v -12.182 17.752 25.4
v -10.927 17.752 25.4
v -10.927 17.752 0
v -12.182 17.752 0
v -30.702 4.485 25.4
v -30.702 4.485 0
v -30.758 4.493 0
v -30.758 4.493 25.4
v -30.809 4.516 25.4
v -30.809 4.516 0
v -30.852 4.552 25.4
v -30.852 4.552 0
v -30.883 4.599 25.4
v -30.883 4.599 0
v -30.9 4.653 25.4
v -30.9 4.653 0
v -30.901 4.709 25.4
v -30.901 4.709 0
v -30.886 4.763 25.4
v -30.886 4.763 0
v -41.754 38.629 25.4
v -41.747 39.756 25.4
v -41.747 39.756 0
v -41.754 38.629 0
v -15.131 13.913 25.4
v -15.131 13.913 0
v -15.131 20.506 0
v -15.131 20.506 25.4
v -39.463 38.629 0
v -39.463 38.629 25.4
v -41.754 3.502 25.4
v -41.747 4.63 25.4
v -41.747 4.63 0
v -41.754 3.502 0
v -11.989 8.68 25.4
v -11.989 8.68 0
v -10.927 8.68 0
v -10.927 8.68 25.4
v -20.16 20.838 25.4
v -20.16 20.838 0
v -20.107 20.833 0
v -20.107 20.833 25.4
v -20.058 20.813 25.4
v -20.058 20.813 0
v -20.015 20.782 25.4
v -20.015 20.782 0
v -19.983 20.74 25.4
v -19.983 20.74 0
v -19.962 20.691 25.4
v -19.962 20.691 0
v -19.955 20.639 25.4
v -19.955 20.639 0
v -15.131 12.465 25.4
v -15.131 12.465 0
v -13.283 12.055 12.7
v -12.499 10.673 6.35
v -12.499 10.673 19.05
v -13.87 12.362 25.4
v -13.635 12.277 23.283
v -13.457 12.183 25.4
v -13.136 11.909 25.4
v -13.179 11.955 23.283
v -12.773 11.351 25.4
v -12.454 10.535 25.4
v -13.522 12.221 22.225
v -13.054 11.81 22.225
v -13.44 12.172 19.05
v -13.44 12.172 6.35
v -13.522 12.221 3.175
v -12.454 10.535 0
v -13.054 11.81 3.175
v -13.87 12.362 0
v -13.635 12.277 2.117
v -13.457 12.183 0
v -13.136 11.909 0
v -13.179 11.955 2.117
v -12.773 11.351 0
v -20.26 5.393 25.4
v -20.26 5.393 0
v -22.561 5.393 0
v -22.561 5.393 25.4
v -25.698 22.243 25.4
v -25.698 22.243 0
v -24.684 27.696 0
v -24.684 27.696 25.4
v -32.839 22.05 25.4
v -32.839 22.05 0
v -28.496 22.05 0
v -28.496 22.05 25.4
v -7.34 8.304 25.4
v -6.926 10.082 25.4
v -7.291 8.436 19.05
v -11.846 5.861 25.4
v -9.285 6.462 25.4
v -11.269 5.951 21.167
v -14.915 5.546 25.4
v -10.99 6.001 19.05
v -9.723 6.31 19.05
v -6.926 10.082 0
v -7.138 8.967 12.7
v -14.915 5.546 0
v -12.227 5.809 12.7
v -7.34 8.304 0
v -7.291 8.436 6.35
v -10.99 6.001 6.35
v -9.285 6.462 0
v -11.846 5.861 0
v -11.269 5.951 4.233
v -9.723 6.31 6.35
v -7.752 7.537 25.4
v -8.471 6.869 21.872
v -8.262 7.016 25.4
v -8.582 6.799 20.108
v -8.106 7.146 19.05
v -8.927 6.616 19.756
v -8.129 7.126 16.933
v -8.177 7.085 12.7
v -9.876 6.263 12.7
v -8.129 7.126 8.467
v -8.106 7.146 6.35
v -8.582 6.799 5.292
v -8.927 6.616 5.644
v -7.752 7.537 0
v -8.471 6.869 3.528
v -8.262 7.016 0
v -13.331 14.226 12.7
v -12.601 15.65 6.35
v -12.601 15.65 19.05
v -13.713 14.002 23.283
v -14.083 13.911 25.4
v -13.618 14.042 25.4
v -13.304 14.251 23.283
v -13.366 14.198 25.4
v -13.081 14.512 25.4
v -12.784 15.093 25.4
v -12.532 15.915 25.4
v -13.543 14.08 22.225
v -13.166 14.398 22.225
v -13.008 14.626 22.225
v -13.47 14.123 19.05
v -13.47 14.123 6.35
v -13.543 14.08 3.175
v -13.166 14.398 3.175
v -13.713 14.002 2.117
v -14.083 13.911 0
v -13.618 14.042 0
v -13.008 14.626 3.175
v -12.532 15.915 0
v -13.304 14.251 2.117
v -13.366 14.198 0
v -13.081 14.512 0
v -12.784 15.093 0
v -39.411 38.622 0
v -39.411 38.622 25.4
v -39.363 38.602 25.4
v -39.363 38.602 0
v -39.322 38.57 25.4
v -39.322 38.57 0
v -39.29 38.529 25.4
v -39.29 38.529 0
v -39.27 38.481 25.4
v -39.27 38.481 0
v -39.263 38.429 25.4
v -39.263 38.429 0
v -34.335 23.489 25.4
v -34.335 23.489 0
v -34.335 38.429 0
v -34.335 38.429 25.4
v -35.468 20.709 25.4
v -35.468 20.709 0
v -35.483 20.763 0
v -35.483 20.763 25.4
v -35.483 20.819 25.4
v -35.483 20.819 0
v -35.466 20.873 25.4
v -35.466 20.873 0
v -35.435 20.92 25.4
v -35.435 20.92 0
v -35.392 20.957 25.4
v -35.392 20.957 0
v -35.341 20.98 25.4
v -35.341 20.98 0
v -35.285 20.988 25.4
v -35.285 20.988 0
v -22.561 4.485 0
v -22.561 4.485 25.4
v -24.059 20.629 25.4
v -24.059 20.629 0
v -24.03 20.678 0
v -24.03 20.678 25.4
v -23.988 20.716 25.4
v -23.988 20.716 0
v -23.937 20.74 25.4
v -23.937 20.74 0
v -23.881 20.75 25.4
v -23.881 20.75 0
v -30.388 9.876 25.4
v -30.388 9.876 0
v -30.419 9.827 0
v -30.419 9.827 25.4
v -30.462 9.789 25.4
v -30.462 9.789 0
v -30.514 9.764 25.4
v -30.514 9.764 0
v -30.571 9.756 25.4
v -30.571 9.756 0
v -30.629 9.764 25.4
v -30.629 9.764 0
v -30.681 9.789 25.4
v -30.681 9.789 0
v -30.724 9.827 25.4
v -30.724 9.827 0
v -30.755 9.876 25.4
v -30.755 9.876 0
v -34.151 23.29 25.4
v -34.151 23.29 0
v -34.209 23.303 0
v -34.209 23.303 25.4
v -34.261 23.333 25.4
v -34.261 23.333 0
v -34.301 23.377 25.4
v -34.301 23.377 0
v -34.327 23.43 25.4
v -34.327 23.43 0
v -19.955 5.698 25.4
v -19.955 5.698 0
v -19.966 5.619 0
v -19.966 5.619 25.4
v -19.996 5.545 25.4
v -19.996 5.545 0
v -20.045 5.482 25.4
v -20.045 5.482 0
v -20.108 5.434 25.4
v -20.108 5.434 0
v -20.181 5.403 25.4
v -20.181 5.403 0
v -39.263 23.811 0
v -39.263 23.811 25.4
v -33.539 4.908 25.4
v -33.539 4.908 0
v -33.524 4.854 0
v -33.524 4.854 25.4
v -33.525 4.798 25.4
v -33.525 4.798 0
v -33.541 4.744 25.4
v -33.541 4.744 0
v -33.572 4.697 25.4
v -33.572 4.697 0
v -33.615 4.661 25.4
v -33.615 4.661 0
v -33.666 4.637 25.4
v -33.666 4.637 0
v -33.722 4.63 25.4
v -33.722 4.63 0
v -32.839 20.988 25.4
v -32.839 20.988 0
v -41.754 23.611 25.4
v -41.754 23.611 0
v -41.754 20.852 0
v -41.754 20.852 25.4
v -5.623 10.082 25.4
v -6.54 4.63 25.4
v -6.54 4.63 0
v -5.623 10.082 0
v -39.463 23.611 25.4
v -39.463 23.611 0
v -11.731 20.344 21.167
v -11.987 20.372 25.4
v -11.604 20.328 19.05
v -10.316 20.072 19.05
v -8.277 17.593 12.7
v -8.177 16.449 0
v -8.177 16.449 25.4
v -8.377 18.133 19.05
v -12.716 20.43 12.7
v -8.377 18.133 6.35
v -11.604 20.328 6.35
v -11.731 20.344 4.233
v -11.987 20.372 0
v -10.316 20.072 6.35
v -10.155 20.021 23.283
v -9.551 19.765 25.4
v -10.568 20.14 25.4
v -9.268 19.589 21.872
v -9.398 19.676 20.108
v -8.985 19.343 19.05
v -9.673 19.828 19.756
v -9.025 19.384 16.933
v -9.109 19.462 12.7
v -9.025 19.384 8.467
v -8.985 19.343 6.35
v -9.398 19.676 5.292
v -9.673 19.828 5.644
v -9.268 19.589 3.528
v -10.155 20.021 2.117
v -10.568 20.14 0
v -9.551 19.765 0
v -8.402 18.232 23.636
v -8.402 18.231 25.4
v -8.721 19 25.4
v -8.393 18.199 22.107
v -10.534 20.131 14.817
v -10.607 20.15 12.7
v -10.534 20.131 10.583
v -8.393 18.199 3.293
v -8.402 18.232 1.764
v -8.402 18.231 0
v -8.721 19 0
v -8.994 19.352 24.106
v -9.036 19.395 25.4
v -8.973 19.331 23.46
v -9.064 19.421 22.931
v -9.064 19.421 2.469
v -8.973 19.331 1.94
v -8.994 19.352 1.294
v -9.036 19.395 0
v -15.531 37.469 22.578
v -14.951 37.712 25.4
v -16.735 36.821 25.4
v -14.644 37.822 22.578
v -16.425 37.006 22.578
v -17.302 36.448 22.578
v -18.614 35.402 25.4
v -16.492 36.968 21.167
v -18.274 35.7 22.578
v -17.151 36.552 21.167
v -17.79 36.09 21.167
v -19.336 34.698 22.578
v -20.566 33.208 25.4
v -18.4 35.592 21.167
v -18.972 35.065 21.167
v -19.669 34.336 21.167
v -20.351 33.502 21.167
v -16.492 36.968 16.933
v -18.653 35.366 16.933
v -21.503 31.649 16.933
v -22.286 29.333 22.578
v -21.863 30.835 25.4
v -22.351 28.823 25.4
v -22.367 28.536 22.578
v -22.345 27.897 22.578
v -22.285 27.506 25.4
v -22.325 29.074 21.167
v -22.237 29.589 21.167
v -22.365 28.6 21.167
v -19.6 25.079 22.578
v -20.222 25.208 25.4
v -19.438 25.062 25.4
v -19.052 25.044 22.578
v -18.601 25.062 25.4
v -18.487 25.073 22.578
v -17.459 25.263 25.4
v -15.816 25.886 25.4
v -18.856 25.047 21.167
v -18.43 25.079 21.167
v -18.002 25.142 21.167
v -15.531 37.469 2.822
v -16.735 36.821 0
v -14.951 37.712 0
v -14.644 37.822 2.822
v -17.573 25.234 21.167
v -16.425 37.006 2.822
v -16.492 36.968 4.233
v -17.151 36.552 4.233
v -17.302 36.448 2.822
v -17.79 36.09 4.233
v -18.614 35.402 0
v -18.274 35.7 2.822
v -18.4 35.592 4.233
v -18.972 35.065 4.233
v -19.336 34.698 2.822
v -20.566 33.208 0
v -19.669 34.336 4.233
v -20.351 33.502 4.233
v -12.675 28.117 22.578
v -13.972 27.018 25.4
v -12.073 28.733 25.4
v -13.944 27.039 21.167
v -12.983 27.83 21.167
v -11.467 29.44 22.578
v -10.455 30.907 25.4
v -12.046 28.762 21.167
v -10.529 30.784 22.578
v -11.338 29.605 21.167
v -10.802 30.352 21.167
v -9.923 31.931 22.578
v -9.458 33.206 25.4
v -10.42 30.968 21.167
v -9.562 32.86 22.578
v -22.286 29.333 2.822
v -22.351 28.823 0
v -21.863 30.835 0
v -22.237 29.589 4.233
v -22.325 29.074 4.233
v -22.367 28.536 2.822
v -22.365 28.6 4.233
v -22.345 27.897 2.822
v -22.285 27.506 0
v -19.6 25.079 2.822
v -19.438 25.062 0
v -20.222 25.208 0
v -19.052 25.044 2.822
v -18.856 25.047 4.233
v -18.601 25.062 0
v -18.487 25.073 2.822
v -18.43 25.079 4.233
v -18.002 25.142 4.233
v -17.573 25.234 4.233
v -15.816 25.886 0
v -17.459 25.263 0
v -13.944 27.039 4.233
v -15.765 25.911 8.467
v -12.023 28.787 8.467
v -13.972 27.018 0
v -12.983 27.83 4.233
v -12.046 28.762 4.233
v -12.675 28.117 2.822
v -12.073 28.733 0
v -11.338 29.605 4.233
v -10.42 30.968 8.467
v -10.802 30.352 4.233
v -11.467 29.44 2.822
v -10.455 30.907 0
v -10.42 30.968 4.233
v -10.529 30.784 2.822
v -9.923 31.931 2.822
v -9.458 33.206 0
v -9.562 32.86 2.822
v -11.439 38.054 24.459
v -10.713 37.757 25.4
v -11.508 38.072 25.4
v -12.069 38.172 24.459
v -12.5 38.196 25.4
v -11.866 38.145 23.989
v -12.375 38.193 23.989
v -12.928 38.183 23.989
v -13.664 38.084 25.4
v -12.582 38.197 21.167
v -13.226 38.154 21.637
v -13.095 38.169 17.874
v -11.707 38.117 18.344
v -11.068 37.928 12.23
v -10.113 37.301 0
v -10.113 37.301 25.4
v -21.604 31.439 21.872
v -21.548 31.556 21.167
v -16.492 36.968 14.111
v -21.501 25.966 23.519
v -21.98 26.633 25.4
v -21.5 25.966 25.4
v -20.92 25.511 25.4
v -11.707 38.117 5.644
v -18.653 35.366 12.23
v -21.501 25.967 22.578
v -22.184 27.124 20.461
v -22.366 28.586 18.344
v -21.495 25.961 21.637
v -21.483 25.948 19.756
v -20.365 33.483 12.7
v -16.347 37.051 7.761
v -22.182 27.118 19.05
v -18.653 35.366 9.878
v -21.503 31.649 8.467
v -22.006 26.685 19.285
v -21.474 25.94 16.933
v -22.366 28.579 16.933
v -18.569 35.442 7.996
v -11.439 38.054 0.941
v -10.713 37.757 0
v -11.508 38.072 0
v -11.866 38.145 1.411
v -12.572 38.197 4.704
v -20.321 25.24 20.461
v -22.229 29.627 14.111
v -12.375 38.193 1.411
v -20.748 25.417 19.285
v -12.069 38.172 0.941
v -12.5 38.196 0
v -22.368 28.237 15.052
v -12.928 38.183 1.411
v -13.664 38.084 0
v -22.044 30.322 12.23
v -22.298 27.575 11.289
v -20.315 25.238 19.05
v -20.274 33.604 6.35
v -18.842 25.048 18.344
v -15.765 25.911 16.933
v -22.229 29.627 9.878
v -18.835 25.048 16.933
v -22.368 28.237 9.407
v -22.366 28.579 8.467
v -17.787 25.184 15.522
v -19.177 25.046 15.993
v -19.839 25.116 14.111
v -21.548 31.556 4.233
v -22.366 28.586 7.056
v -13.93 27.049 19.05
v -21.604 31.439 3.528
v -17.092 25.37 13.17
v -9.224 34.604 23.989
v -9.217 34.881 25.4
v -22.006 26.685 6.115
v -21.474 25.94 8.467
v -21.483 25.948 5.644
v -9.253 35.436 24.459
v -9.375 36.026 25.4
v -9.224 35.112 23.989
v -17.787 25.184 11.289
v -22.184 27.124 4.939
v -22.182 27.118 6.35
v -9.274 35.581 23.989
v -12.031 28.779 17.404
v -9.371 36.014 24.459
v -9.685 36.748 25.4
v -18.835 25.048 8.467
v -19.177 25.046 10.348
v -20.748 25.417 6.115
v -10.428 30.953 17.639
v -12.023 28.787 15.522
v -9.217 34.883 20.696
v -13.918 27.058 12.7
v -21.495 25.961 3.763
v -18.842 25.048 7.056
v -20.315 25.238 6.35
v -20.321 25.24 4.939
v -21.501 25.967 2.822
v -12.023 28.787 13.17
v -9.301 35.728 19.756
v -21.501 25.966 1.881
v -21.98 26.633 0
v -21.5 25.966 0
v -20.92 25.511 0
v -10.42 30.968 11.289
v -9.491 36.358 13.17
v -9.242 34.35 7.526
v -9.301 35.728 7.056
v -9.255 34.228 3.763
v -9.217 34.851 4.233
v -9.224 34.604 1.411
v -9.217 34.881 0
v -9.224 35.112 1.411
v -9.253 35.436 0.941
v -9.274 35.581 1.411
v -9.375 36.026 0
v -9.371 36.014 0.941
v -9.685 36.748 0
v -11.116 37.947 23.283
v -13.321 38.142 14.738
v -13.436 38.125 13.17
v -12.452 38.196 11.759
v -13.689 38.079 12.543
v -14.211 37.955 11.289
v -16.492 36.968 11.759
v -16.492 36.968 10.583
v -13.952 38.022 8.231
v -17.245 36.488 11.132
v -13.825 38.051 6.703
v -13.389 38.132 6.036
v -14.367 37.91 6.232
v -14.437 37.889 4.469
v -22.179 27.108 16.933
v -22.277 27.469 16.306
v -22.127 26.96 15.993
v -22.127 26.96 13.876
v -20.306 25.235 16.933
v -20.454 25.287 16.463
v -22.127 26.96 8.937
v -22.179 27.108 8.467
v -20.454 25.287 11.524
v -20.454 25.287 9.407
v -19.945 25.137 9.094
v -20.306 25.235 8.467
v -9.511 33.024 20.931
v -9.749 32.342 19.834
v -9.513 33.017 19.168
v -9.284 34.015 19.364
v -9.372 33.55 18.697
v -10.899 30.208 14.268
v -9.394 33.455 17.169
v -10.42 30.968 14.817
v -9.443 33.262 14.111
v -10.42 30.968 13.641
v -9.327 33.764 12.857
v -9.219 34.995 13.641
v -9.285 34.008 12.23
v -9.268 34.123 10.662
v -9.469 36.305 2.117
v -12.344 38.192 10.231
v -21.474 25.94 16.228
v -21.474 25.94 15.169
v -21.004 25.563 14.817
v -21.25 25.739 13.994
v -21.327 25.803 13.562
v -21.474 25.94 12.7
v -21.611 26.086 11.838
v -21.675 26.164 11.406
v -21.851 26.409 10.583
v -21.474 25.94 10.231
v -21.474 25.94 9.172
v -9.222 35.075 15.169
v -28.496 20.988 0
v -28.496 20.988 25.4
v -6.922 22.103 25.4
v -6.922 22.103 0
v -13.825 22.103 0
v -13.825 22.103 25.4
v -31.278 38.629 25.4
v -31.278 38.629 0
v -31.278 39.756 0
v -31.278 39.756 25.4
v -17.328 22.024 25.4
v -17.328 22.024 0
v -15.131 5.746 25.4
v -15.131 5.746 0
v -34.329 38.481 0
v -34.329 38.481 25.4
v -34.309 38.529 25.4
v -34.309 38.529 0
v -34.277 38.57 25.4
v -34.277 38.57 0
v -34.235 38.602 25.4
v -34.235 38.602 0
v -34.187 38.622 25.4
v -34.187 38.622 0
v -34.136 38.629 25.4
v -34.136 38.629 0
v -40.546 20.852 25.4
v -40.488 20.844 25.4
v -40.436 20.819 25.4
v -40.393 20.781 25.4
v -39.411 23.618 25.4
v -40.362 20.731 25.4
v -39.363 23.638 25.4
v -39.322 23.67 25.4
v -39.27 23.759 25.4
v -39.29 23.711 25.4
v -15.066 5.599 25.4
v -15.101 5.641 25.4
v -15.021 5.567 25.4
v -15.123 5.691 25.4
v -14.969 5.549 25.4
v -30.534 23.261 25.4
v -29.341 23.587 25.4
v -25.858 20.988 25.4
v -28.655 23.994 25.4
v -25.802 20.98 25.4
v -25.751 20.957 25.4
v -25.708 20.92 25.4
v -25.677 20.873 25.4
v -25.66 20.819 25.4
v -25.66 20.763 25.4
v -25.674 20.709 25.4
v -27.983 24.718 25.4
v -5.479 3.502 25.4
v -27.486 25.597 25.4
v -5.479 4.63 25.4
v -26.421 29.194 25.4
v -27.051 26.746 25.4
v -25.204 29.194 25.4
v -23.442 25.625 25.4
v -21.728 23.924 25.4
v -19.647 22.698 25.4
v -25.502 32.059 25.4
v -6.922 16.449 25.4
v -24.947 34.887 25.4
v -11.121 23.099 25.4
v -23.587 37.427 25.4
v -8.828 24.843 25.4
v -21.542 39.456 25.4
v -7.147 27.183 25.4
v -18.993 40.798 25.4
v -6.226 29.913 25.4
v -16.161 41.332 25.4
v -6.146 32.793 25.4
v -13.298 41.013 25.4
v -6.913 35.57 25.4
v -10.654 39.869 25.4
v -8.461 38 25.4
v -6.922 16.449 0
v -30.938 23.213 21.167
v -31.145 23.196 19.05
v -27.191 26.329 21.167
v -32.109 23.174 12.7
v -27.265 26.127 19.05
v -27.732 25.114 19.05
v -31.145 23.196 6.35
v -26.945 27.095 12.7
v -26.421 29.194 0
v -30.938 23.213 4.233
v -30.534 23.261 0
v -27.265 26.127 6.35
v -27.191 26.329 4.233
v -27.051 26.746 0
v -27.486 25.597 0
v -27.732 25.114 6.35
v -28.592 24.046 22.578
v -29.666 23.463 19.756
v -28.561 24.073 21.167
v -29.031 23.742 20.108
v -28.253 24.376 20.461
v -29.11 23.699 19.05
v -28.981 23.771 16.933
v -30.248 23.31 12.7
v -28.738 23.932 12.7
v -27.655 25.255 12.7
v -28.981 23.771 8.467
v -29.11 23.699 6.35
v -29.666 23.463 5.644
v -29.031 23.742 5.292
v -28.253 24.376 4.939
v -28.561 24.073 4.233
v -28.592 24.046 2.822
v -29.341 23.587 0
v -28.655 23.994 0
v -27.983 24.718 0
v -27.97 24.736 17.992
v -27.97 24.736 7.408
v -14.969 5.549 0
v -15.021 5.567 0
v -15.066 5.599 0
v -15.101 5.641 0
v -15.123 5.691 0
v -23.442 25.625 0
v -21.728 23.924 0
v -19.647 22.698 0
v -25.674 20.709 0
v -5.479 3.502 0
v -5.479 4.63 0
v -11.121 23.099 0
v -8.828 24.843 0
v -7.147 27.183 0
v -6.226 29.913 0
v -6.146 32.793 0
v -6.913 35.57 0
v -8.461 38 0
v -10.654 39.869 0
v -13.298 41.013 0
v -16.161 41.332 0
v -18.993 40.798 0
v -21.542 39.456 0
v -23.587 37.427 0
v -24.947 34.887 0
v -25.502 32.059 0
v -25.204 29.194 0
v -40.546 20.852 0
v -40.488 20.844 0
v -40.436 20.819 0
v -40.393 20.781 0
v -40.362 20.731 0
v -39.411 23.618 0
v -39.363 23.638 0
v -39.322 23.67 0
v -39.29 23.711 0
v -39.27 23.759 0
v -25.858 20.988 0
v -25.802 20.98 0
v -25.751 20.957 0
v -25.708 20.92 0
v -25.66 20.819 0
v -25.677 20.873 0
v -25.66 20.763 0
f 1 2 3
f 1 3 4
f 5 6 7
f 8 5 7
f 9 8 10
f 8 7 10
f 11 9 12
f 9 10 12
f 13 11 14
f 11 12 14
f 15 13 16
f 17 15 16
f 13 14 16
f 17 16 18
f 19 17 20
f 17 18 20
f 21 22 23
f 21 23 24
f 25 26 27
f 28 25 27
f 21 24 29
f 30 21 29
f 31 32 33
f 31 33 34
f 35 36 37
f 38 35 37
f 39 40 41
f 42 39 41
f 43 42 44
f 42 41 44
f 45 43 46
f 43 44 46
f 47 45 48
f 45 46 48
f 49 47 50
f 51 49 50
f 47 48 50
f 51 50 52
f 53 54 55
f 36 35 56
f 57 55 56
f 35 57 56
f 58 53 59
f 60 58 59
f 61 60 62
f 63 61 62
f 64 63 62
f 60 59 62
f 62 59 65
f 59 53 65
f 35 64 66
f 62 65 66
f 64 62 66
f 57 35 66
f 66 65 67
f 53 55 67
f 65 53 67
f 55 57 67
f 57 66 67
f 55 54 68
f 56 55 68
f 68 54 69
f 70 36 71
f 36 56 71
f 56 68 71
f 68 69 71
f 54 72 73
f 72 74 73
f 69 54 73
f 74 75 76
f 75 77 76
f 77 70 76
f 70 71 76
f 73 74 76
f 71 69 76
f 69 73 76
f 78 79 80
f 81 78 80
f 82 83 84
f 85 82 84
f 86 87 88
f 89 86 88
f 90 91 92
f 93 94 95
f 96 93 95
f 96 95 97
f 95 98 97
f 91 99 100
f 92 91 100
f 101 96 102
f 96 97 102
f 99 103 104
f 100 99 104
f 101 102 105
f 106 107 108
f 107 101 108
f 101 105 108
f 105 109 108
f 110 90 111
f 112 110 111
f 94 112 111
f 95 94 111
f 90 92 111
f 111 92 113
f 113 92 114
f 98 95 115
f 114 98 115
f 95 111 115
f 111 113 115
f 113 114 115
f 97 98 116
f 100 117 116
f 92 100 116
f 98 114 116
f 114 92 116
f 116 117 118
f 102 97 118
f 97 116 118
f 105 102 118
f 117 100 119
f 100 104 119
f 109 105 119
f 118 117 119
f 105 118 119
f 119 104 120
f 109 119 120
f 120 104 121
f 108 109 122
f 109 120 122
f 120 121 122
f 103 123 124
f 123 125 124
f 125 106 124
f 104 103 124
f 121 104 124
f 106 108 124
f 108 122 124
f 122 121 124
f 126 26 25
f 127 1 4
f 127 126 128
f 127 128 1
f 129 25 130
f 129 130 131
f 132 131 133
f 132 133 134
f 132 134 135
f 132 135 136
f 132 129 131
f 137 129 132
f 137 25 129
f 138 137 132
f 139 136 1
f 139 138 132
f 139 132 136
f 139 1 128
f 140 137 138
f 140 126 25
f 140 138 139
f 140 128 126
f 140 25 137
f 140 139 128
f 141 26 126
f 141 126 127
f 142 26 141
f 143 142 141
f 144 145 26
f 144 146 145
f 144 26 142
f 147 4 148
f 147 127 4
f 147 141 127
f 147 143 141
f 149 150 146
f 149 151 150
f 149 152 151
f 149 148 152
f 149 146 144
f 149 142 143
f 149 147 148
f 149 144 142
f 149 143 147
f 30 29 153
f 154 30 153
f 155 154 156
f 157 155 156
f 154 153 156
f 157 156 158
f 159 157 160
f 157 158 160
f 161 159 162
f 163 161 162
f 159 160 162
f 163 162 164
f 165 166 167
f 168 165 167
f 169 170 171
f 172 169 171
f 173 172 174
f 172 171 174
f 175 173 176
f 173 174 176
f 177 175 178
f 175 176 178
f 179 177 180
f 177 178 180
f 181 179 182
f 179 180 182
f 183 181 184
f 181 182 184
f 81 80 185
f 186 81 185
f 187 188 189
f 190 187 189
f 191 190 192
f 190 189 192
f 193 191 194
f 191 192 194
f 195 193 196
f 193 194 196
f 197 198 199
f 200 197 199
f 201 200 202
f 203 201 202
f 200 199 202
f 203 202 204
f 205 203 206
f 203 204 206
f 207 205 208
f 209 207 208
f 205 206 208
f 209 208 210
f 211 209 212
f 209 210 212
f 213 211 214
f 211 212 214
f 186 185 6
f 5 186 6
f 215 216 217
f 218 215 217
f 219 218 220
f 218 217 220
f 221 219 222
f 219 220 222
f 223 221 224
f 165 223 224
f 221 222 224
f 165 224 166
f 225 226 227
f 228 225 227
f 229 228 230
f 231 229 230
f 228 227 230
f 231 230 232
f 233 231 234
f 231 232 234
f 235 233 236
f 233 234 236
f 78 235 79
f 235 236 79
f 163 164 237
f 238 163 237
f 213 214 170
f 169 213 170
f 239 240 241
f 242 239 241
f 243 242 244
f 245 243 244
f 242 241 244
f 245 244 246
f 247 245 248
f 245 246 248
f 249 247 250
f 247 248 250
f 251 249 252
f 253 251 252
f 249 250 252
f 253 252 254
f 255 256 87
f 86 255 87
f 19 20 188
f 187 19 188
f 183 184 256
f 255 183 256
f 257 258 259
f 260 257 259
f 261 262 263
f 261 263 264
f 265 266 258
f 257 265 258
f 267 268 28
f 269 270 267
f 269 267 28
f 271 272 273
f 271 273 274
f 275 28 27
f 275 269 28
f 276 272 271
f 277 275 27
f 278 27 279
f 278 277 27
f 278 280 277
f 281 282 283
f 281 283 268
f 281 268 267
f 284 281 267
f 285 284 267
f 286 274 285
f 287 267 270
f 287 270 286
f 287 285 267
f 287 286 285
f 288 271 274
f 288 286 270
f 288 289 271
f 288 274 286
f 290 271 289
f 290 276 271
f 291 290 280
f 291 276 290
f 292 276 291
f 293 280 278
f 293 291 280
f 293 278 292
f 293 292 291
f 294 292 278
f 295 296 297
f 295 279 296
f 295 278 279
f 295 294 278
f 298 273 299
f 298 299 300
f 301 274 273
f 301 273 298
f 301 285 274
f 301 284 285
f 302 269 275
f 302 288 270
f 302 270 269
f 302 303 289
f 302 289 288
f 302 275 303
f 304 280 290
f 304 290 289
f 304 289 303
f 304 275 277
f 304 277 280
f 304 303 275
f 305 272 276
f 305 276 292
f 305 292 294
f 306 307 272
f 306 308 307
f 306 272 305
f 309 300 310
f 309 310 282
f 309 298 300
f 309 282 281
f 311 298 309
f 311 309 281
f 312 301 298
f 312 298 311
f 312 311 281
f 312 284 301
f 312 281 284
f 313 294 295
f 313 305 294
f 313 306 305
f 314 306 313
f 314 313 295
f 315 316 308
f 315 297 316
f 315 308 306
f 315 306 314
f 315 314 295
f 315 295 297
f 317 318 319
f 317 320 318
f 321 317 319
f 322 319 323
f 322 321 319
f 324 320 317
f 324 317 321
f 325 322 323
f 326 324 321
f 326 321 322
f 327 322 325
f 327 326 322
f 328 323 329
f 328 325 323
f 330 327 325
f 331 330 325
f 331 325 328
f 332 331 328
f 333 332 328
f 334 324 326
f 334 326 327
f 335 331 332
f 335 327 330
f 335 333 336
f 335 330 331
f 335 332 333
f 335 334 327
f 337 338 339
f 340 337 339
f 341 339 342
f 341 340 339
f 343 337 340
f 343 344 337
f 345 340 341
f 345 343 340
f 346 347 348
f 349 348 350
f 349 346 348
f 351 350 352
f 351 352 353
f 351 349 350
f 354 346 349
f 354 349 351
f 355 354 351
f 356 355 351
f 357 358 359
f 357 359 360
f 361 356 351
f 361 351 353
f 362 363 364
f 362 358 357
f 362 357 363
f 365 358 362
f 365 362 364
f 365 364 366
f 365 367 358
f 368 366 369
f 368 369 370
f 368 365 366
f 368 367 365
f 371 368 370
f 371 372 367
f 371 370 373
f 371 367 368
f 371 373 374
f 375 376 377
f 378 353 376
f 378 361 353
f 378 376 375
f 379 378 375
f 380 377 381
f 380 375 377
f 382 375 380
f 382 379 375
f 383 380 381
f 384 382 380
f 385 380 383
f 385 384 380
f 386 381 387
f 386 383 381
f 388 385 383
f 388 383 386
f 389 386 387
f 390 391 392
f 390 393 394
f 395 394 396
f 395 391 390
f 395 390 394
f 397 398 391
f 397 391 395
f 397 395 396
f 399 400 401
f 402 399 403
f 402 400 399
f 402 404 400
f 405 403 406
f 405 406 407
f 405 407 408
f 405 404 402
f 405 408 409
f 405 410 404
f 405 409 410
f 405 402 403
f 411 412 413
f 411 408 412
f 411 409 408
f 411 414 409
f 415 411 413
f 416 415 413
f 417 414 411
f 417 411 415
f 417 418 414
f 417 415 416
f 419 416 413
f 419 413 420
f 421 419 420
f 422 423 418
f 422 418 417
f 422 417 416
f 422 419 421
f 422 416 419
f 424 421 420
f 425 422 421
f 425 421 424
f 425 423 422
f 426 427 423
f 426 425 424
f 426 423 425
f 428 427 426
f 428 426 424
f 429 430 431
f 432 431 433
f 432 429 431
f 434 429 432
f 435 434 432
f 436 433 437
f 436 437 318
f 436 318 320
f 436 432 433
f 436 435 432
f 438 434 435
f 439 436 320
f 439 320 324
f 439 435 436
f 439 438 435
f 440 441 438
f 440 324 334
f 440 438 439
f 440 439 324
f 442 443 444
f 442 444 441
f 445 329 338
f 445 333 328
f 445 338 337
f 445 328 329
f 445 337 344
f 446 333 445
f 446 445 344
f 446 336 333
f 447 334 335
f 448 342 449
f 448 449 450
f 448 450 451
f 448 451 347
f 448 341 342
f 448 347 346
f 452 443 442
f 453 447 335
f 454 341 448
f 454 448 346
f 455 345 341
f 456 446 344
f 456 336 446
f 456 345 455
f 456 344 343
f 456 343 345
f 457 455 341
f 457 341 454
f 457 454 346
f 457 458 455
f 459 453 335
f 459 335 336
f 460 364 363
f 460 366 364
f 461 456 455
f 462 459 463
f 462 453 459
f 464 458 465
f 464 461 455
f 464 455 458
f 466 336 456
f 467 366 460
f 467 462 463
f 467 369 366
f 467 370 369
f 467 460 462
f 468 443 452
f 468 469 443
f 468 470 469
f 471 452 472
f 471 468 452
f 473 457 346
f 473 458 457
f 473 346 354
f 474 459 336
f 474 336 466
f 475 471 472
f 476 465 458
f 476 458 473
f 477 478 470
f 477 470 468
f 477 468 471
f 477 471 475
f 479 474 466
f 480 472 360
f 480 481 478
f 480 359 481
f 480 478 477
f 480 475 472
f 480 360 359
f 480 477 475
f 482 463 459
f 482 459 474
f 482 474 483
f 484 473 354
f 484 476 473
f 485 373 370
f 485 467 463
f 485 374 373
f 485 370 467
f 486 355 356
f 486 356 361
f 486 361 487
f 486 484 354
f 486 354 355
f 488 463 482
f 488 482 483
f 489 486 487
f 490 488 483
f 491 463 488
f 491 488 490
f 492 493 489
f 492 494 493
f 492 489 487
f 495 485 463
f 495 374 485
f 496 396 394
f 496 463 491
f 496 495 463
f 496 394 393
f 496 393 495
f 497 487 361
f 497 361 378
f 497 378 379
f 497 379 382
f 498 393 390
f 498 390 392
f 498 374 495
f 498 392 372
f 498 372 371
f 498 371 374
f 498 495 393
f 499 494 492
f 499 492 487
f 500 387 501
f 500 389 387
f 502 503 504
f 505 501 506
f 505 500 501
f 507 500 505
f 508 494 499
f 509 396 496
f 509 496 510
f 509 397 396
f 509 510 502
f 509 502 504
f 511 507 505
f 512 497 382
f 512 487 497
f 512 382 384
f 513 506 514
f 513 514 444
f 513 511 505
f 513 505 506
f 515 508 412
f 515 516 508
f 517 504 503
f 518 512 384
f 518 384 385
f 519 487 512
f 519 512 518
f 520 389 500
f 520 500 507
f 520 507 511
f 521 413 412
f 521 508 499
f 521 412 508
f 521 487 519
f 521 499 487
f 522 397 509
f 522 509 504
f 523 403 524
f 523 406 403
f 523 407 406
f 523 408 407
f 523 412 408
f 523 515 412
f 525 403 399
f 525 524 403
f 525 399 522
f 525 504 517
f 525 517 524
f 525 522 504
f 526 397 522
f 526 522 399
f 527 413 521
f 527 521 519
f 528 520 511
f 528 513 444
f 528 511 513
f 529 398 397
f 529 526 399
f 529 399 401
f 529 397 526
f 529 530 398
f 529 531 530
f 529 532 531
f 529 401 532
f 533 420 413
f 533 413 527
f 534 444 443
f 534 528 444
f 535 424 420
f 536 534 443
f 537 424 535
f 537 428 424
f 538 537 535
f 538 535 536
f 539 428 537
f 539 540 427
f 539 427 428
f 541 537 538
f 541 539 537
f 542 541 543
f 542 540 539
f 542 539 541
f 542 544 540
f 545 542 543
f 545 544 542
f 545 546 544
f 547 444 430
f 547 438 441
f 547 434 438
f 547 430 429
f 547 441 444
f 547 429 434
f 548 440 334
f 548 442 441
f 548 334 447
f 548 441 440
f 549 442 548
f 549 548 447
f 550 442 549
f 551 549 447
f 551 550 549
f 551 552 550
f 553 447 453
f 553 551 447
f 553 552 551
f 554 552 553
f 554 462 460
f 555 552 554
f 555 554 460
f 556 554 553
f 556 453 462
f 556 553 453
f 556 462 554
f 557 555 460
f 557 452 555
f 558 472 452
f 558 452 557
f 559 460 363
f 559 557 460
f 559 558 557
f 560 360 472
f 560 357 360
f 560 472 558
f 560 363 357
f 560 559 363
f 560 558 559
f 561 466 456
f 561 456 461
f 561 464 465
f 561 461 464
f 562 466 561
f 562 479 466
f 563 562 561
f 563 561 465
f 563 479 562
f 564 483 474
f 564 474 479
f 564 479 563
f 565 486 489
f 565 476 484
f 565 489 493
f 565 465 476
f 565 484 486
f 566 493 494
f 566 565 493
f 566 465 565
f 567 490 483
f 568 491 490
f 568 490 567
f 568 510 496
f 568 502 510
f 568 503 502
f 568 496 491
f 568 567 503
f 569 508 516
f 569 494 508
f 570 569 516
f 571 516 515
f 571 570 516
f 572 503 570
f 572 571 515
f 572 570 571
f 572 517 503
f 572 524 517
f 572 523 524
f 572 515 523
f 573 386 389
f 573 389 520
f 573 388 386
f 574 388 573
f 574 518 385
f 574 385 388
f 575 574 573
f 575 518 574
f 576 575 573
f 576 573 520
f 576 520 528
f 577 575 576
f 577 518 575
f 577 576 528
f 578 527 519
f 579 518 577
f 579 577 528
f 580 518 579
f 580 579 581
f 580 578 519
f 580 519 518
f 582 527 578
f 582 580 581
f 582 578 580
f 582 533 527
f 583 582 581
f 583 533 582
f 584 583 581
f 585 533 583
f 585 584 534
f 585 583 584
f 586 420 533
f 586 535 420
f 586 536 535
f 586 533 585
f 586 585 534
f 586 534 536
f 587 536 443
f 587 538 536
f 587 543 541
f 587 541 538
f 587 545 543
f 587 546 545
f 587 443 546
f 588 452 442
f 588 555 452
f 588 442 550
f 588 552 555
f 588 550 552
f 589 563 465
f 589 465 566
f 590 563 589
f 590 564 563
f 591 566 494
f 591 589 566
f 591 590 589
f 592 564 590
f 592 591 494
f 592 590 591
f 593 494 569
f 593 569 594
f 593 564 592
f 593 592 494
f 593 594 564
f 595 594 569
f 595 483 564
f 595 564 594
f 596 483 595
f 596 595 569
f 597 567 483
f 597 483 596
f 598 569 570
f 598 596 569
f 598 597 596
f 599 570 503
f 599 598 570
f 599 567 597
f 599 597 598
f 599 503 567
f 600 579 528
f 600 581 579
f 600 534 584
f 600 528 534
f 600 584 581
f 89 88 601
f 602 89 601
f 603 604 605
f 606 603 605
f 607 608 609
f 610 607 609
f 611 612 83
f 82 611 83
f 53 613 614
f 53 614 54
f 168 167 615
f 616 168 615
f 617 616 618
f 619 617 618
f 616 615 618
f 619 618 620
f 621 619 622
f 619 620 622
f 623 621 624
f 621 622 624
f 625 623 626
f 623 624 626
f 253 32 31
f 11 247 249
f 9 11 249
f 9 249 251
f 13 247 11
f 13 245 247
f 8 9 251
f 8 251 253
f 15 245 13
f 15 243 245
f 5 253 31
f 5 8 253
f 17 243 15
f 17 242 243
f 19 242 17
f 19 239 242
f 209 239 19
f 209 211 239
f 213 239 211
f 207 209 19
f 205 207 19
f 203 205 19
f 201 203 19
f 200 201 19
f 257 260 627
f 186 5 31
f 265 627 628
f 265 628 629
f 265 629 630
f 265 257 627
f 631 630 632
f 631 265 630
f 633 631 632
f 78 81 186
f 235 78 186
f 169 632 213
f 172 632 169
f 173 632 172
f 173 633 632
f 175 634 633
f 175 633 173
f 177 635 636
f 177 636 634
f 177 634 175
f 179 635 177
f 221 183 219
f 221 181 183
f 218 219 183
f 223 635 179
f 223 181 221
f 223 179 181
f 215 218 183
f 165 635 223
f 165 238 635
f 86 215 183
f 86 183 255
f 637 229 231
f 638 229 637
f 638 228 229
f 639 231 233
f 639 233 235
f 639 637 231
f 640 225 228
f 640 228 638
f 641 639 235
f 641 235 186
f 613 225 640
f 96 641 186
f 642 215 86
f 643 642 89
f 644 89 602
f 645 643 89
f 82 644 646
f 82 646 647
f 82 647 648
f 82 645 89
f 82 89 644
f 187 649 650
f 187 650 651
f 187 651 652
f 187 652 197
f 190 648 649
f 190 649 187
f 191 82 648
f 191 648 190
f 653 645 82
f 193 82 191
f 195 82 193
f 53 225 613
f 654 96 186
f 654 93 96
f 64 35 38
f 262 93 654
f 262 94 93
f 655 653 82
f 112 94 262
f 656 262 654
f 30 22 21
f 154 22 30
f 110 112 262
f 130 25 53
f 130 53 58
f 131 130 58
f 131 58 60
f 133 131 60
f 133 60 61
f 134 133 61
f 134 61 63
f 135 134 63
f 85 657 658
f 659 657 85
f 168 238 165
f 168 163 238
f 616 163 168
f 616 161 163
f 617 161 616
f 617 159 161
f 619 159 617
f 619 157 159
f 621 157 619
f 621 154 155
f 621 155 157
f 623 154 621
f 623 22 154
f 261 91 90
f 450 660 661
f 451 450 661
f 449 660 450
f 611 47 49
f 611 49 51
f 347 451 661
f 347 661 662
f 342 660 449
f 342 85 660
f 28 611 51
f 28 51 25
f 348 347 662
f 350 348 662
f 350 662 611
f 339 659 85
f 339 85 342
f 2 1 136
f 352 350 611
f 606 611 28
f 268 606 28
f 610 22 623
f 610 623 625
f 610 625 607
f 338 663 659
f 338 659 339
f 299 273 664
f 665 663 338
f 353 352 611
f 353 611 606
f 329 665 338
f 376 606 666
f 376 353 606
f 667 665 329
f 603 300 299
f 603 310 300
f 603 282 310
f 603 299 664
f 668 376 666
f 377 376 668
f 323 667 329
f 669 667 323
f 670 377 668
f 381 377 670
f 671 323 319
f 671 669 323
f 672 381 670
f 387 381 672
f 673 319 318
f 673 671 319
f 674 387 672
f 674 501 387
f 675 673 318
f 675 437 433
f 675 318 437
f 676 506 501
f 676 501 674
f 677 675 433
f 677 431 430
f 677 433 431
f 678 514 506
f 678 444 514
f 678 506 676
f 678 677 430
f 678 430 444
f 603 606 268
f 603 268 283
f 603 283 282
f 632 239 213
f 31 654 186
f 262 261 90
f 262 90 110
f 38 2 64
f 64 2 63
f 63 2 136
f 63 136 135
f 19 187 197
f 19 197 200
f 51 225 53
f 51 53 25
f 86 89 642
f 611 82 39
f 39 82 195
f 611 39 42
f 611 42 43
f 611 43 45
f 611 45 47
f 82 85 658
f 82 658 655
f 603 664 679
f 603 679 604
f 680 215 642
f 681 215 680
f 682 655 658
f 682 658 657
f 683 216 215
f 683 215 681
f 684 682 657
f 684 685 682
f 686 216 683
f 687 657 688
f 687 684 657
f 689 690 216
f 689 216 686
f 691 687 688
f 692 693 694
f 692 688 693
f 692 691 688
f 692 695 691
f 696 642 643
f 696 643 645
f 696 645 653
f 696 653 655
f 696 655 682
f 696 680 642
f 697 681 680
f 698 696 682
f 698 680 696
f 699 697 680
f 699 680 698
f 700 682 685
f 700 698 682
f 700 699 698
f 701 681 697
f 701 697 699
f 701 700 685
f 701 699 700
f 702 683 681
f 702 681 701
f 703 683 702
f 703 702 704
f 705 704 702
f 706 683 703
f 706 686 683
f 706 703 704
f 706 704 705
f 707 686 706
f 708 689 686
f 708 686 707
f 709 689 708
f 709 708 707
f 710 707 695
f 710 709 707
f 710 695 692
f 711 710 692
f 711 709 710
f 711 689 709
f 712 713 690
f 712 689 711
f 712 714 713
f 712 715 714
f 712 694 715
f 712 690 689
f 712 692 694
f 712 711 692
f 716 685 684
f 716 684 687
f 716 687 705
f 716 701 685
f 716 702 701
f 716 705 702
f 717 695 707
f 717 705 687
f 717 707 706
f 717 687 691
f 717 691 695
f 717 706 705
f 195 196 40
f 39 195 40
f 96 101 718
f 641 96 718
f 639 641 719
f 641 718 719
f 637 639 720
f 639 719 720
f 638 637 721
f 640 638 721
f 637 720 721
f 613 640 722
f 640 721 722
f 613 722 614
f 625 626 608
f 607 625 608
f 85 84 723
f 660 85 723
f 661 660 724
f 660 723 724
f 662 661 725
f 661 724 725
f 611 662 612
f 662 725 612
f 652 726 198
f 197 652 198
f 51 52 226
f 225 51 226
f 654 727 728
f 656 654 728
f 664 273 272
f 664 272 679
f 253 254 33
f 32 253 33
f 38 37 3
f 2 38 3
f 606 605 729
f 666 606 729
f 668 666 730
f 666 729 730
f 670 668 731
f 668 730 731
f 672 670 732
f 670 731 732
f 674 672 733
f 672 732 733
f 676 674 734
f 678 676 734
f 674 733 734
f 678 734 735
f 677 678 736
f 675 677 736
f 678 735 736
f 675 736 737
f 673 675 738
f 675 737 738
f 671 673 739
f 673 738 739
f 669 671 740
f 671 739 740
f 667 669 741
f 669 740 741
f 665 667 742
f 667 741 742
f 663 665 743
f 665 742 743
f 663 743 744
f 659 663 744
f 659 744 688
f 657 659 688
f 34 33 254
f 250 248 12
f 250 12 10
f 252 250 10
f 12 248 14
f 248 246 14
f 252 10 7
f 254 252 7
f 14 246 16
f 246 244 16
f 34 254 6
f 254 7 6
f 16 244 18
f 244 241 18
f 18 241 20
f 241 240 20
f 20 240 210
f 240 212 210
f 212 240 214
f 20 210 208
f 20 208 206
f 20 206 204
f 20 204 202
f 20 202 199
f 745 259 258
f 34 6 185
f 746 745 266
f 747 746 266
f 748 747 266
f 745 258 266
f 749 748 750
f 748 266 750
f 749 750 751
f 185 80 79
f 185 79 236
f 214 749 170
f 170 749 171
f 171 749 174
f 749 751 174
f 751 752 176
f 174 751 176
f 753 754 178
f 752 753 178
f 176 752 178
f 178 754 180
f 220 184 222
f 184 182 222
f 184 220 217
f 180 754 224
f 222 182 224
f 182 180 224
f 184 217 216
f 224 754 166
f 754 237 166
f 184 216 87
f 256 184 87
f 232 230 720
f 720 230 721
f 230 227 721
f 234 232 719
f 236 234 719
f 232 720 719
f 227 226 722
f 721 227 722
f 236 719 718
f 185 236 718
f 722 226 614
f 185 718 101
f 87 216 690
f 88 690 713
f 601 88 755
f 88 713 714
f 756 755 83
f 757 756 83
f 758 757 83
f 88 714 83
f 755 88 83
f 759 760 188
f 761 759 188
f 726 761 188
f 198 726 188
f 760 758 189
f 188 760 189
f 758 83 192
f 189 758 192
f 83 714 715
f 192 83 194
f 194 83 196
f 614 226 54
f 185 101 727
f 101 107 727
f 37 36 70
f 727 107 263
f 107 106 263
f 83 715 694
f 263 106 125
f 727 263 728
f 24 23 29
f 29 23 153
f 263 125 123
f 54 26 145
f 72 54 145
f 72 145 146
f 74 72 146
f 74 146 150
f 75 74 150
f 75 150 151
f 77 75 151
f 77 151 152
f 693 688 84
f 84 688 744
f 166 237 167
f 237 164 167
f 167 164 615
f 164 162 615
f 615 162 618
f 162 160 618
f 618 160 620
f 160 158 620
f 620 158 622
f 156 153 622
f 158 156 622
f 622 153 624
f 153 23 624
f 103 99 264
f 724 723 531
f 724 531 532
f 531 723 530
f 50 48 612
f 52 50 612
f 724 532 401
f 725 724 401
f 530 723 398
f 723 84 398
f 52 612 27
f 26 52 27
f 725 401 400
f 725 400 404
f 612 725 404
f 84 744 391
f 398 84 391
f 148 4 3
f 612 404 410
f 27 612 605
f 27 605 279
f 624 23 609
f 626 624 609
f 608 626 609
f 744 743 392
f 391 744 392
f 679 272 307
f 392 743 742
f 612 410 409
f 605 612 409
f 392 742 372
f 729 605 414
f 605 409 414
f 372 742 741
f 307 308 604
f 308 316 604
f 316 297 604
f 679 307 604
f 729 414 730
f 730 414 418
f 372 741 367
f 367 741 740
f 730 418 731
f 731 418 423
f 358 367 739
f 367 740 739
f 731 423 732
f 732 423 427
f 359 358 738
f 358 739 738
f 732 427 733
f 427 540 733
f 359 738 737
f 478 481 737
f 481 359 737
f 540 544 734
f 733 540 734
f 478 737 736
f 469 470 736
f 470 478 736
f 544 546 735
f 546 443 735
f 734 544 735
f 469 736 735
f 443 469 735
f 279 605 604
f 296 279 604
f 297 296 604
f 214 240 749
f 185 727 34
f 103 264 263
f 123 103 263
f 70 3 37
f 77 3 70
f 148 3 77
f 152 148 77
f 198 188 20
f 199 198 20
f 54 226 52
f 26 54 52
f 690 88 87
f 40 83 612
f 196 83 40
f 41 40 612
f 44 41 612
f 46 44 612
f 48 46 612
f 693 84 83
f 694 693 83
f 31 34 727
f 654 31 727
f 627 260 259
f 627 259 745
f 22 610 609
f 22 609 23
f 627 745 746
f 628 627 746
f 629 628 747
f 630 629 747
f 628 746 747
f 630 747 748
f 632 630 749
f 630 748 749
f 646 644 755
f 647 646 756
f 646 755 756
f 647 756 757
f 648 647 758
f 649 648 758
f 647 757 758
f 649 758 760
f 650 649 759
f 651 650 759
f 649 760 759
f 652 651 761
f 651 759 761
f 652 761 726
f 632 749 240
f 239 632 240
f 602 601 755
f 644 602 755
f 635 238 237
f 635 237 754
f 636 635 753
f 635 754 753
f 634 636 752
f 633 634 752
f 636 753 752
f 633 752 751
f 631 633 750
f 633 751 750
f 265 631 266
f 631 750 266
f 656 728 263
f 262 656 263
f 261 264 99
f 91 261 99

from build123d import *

# Parameters (mm, degrees)
F1_DEPTH = 25.4


with BuildPart() as f1:
    # F0 (on Top) → F1 (new body)
    with BuildSketch(Plane.XY):
        with BuildLine():
            Line((-6.922144349, 22.1033166371), (-13.8246832876, 22.1033166371))
            ThreePointArc((-13.8246832876, 22.1033166371), (-10.6539158919, 39.8689876269), (-25.2042392324, 29.1937395135))
            Line((-25.2042392324, 29.1937395135), (-26.4214727575, 29.1937395135))
            add(Edge.make_bspline(
                [(-34.1513931679, 23.289673573), (-32.0734965127, 23.1247772138), (-27.8797011755, 22.8512177675), (-26.9138783096, 27.0520360031), (-26.4214727575, 29.1937395135)],
                knots=[0.0142542389, 0.0142542389, 0.0142542389, 0.0142542389, 0.4974371567, 1, 1, 1, 1], degree=3))
            ThreePointArc((-34.1513931679, 23.289673573), (-34.2823084118, 23.3532510684), (-34.3353301287, 23.488785553))
            Line((-34.3353301287, 23.488785553), (-34.3353301287, 38.4288290516))
            ThreePointArc((-34.3353301287, 38.4288290516), (-34.2768282351, 38.5700651165), (-34.1355921701, 38.6285670102))
            Line((-34.1355921701, 38.6285670102), (-31.2780365348, 38.6285670102))
            Line((-31.2780365348, 38.6285670102), (-31.2780365348, 39.7564433515))
            Line((-31.2780365348, 39.7564433515), (-41.7470708489, 39.7564433515))
            Line((-41.7470708489, 39.7564433515), (-41.7543016374, 38.6285670102))
            Line((-41.7543016374, 38.6285670102), (-39.4631614909, 38.6285670102))
            ThreePointArc((-39.4631614909, 38.6285670102), (-39.3219254259, 38.5700651165), (-39.2634235322, 38.4288290516))
            Line((-39.2634235322, 38.4288290516), (-39.2634235322, 23.8110320643))
            ThreePointArc((-39.2634235322, 23.8110320643), (-39.3219254259, 23.6697959993), (-39.4631614909, 23.6112941056))
            Line((-39.4631614909, 23.6112941056), (-41.7543016374, 23.6112941056))
            Line((-41.7543016374, 23.6112941056), (-41.7543016374, 20.8520144224))
            Line((-41.7543016374, 20.8520144224), (-40.5457352105, 20.8520144224))
            ThreePointArc((-40.5457352105, 20.8520144224), (-40.4359695253, 20.8191499082), (-40.3623251256, 20.7313712984))
            Line((-40.3623251256, 20.7313712984), (-33.538729512, 4.9083879515))
            ThreePointArc((-33.538729512, 4.9083879515), (-33.5552661525, 4.7195274317), (-33.7221395969, 4.6295551583))
            Line((-33.7221395969, 4.6295551583), (-41.7470708489, 4.6295551583))
            Line((-41.7470708489, 4.6295551583), (-41.7543016374, 3.501678817))
            Line((-41.7543016374, 3.501678817), (-5.4787136614, 3.501678817))
            Line((-5.4787136614, 3.501678817), (-5.4787136614, 4.6295551583))
            Line((-5.4787136614, 4.6295551583), (-6.5403282642, 4.6295551583))
            Line((-6.5403282642, 4.6295551583), (-5.6234793738, 10.082394816))
            Line((-5.6234793738, 10.082394816), (-6.9263698533, 10.082394816))
            add(Edge.make_bspline(
                [(-6.9263698533, 10.082394816), (-7.1118061723, 8.9523784677), (-7.5649071247, 6.191260869), (-12.1620701189, 5.7727957343), (-14.914668792, 5.5464362064)],
                knots=[0, 0, 0, 0, 0.4030311798, 0.9847791008, 0.9847791008, 0.9847791008, 0.9847791008], degree=3))
            ThreePointArc((-14.914668792, 5.5464362064), (-15.0663635807, 5.598592373), (-15.130776912, 5.7455022003))
            Line((-15.130776912, 5.7455022003), (-15.130776912, 12.4651836231))
            add(Edge.make_bspline(
                [(-15.130776912, 12.4651836231), (-14.4511532344, 12.4706418779), (-12.8322635737, 12.48364365), (-12.2985836887, 10.0763885396), (-11.988947168, 8.6797196418)],
                knots=[0, 0, 0, 0, 0.4198085231, 1, 1, 1, 1], degree=3))
            Line((-11.988947168, 8.6797196418), (-10.9273325652, 8.6797196418))
            Line((-10.9273325652, 8.6797196418), (-10.9273325652, 17.7517011762))
            Line((-10.9273325652, 17.7517011762), (-12.1819674969, 17.7517011762))
            add(Edge.make_bspline(
                [(-15.130776912, 13.912839815), (-14.4627640937, 13.8688908923), (-12.8429680106, 13.7623236366), (-12.426614518, 16.2751677835), (-12.1819674969, 17.7517011762)],
                knots=[0, 0, 0, 0, 0.4124055029, 1, 1, 1, 1], degree=3))
            Line((-15.130776912, 13.912839815), (-15.130776912, 20.5062981695))
            add(Edge.make_bspline(
                [(-8.1767849624, 16.448808834), (-8.2510794881, 17.6109695891), (-8.4287882332, 20.390799294), (-12.6653755921, 20.4638106194), (-15.130776912, 20.5062981695)],
                knots=[0, 0, 0, 0, 0.4180690469, 1, 1, 1, 1], degree=3))
            Line((-8.1767849624, 16.448808834), (-6.922144349, 16.448808834))
            Line((-6.922144349, 16.448808834), (-6.922144349, 22.1033166371))
        make_face()
        with BuildLine():
            Line((-30.8858141466, 4.7634703214), (-24.0593529441, 20.6291089683))
            ThreePointArc((-24.0593529441, 20.6291089683), (-23.9876900428, 20.7156746015), (-23.8806319712, 20.7498469527))
            Line((-23.8806319712, 20.7498469527), (-20.1597697526, 20.8384395209))
            ThreePointArc((-20.1597697526, 20.8384395209), (-20.015470377, 20.7816652506), (-19.9552774429, 20.6387581541))
            Line((-19.9552774429, 20.6387581541), (-19.9552774429, 5.6978869252))
            ThreePointArc((-19.9552774429, 5.6978869252), (-20.044551296, 5.4823607783), (-20.2600774429, 5.3930869252))
            Line((-20.2600774429, 5.3930869252), (-22.5610584021, 5.3930869252))
            Line((-22.5610584021, 5.3930869252), (-22.5610584021, 4.4847889803))
            Line((-22.5610584021, 4.4847889803), (-30.7023388227, 4.4847889803))
            ThreePointArc((-30.7023388227, 4.4847889803), (-30.8691669411, 4.5746923769), (-30.8858141466, 4.7634703214))
        make_face(mode=Mode.SUBTRACT)
        with BuildLine():
            ThreePointArc((-35.4683719073, 20.7086384706), (-35.4522760461, 20.897826752), (-35.285222578, 20.9880732))
            Line((-35.285222578, 20.9880732), (-32.8394174576, 20.9880732))
            Line((-32.8394174576, 20.9880732), (-32.8394174576, 22.0496878028))
            Line((-32.8394174576, 22.0496878028), (-28.4964479506, 22.0496878028))
            Line((-28.4964479506, 22.0496878028), (-28.4964479506, 20.9880732))
            Line((-28.4964479506, 20.9880732), (-25.8576280892, 20.9880732))
            ThreePointArc((-25.8576280892, 20.9880732), (-25.6905746211, 20.897826752), (-25.6744787599, 20.7086384706))
            Line((-25.6744787599, 20.7086384706), (-30.3882760043, 9.8759686425))
            ThreePointArc((-30.3882760043, 9.8759686425), (-30.5714253336, 9.7559274546), (-30.754574663, 9.8759686425))
            Line((-30.754574663, 9.8759686425), (-35.4683719073, 20.7086384706))
        make_face(mode=Mode.SUBTRACT)
        with BuildLine():
            Line((-25.6976429373, 22.242706269), (-24.6842838824, 27.6955459267))
            ThreePointArc((-24.6842838824, 27.6955459267), (-21.7277147025, 23.9239461935), (-17.328214106, 22.0237724214))
            Line((-17.328214106, 22.0237724214), (-25.6976429373, 22.242706269))
        make_face(mode=Mode.SUBTRACT)
        with BuildLine():
            add(Edge.make_bspline(
                [(-10.112560244, 37.3013498764), (-15.8505308963, 43.0393233508), (-21.5028495703, 31.6490368044), (-27.1551682443, 20.258750258), (-15.764878918, 25.91106333), (-4.3745895917, 31.563376402), (-10.112560244, 37.3013498764)],
                knots=[0, 0, 0, 2.0943951024, 2.0943951024, 4.1887902048, 4.1887902048, 6.2831853072, 6.2831853072, 6.2831853072], degree=2, weights=[1, 0.5, 1, 0.5, 1, 0.5, 1]))
        make_face(mode=Mode.SUBTRACT)
    extrude(amount=F1_DEPTH)


solid = f1.part
